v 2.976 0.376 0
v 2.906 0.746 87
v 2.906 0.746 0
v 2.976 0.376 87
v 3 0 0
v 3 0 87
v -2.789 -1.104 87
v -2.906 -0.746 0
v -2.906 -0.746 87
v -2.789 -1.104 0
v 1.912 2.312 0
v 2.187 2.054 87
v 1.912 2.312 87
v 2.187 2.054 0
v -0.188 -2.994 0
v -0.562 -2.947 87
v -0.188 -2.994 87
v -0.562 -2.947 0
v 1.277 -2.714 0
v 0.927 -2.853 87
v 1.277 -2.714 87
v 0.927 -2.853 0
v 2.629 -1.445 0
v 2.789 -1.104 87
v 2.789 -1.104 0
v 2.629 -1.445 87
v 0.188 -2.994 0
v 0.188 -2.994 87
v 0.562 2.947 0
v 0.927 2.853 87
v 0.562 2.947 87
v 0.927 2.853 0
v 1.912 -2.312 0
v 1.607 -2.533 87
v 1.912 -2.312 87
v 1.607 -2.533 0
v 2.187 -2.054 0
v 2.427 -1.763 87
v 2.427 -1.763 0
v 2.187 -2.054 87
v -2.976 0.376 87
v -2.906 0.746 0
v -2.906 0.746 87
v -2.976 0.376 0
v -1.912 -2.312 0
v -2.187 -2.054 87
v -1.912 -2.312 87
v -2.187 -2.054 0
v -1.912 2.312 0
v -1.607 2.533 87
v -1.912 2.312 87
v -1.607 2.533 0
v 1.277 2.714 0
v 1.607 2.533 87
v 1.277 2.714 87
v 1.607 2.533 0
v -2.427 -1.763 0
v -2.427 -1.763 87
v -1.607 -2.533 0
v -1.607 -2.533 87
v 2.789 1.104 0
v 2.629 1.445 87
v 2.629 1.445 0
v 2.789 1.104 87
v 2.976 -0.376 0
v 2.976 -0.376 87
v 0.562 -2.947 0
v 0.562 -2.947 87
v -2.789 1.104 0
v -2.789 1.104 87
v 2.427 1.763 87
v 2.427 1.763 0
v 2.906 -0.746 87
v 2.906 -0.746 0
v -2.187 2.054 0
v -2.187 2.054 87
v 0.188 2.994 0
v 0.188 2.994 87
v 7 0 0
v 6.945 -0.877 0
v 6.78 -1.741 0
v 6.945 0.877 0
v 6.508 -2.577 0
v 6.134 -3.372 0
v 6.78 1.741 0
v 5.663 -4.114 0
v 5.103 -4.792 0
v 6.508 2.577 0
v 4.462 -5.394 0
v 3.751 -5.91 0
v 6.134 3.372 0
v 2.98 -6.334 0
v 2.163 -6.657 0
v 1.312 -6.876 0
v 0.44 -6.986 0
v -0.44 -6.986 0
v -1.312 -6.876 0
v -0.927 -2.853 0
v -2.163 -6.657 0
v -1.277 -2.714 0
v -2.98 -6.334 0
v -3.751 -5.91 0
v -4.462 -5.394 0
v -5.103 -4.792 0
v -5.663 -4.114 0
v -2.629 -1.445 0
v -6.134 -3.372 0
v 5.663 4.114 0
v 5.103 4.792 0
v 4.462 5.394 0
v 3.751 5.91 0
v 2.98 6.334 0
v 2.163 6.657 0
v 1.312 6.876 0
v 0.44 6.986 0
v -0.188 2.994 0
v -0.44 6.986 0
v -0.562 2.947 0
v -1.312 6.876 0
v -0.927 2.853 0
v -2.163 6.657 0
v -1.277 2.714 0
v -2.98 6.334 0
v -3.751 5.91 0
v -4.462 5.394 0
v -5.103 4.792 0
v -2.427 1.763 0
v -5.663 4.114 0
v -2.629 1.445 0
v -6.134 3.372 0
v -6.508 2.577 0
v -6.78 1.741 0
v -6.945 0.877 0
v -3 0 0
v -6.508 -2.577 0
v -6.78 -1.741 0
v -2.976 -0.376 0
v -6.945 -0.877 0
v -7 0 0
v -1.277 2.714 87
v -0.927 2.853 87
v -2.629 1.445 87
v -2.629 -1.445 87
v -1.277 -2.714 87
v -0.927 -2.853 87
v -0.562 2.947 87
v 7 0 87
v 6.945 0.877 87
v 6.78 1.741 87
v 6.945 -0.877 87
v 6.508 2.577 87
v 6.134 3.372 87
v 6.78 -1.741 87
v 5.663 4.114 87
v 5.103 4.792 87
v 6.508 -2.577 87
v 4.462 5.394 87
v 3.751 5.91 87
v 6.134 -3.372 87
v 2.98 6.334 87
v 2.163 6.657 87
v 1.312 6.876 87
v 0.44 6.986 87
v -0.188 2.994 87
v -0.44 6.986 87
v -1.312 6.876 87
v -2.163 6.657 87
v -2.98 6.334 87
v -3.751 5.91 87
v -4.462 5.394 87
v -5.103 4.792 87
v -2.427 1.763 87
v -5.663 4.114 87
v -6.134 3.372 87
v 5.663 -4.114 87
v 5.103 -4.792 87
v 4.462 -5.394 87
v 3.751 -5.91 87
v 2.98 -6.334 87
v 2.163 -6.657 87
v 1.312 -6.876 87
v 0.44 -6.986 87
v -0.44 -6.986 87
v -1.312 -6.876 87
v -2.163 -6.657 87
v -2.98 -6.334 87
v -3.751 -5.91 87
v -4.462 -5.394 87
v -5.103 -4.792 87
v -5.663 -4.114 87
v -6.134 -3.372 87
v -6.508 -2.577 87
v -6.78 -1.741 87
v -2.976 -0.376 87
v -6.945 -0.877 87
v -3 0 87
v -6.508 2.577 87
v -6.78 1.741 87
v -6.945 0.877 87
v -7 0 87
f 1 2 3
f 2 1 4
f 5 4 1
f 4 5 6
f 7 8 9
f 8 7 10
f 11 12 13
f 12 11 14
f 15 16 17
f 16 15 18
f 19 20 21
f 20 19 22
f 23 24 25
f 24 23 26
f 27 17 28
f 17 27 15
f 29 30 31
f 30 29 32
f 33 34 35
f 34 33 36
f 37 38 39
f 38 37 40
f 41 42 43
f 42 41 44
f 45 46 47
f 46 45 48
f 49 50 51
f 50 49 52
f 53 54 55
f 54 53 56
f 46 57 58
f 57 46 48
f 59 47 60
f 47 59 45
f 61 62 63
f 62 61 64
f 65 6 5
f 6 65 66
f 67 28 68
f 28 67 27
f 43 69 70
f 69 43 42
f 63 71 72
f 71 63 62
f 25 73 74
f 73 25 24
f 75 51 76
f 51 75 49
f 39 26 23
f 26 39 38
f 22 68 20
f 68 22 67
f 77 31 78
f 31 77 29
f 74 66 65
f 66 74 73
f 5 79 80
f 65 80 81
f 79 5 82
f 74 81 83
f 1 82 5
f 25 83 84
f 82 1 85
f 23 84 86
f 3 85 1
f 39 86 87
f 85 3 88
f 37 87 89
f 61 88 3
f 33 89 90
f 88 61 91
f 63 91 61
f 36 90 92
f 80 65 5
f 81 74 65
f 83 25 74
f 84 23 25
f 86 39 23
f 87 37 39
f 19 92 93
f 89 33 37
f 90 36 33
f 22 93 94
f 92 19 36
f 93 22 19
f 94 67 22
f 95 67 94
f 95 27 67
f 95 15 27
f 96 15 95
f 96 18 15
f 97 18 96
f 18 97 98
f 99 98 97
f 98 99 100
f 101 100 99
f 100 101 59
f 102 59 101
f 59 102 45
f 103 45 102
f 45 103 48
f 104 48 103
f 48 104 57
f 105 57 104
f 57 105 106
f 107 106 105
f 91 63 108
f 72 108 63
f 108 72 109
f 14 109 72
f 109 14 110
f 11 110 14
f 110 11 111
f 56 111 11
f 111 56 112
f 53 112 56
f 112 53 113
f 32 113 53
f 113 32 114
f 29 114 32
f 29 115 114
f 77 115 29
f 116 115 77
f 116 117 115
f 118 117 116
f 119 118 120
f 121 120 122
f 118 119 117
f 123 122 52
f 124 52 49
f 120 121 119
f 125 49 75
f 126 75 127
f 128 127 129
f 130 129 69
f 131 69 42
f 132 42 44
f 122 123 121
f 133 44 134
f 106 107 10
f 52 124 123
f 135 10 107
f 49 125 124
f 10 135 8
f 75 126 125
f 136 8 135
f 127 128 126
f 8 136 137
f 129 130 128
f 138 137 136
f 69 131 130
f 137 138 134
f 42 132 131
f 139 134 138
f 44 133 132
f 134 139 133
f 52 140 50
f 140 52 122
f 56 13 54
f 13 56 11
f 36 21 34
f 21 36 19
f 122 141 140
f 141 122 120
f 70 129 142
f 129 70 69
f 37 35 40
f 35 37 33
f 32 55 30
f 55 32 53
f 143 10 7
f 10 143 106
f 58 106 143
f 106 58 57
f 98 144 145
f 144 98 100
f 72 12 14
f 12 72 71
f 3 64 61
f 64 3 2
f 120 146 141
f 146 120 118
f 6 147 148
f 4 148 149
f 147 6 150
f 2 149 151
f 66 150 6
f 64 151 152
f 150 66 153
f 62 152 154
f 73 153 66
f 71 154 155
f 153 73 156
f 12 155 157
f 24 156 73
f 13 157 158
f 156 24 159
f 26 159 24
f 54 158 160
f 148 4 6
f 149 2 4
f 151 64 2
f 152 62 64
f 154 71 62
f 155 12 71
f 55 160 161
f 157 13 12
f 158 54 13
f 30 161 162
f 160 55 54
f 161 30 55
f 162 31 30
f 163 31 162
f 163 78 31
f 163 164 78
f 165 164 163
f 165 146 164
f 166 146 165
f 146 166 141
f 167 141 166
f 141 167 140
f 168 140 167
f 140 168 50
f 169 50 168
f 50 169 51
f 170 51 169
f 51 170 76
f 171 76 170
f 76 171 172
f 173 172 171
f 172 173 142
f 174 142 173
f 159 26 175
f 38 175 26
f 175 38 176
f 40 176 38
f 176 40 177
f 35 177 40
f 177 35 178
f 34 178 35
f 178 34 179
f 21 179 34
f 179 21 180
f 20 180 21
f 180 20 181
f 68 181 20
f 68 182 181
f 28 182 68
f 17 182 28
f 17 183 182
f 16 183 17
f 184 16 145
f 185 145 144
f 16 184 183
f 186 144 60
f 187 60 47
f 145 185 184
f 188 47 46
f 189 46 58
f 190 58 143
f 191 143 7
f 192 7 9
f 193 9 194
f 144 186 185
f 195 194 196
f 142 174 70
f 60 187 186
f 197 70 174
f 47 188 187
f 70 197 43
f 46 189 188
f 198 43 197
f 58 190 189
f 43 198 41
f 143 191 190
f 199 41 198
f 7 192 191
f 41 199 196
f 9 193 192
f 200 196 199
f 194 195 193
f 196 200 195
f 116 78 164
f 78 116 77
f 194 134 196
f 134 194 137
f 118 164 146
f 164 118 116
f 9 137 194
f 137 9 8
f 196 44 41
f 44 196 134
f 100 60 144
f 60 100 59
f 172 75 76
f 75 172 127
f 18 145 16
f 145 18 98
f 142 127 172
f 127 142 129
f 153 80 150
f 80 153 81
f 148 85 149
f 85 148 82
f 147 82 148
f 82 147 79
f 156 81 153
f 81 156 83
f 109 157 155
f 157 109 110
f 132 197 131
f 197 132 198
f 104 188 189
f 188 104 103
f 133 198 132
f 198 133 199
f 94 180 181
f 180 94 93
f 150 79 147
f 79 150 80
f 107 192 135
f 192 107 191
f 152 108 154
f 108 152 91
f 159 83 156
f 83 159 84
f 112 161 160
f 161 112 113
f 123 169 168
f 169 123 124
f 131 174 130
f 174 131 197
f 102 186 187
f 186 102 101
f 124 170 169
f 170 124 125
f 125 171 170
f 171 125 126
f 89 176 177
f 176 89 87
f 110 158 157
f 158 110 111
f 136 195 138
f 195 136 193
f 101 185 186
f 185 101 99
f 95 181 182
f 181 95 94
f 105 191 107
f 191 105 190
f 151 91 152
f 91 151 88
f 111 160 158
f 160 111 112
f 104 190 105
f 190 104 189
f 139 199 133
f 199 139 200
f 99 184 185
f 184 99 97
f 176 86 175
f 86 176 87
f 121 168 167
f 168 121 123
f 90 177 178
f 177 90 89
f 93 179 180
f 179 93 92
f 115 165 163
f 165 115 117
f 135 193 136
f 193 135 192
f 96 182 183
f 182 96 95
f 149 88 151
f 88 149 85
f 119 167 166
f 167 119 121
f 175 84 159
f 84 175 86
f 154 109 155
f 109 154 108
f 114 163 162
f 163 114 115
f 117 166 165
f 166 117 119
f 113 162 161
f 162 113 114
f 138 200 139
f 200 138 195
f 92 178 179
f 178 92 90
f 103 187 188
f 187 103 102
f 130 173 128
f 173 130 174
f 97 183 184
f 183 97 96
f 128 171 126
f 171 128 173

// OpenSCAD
$fn = 50;


difference() {
	union() {
		cylinder(h = 87, r = 7.0000000000);
	}
	union() {
		cylinder(h = 87, r = 3.0000000000);
		cylinder(h = 87, r = 3.0000000000);
		cylinder(h = 87, r = 1.5000000000);
		cylinder(h = 87, r = 1.5000000000);
		cylinder(h = 87, r = 1.5000000000);
		cylinder(h = 87, r = 1.5000000000);
		cylinder(h = 87, r = 1.5000000000);
		cylinder(h = 87, r = 1.5000000000);
	}
}
